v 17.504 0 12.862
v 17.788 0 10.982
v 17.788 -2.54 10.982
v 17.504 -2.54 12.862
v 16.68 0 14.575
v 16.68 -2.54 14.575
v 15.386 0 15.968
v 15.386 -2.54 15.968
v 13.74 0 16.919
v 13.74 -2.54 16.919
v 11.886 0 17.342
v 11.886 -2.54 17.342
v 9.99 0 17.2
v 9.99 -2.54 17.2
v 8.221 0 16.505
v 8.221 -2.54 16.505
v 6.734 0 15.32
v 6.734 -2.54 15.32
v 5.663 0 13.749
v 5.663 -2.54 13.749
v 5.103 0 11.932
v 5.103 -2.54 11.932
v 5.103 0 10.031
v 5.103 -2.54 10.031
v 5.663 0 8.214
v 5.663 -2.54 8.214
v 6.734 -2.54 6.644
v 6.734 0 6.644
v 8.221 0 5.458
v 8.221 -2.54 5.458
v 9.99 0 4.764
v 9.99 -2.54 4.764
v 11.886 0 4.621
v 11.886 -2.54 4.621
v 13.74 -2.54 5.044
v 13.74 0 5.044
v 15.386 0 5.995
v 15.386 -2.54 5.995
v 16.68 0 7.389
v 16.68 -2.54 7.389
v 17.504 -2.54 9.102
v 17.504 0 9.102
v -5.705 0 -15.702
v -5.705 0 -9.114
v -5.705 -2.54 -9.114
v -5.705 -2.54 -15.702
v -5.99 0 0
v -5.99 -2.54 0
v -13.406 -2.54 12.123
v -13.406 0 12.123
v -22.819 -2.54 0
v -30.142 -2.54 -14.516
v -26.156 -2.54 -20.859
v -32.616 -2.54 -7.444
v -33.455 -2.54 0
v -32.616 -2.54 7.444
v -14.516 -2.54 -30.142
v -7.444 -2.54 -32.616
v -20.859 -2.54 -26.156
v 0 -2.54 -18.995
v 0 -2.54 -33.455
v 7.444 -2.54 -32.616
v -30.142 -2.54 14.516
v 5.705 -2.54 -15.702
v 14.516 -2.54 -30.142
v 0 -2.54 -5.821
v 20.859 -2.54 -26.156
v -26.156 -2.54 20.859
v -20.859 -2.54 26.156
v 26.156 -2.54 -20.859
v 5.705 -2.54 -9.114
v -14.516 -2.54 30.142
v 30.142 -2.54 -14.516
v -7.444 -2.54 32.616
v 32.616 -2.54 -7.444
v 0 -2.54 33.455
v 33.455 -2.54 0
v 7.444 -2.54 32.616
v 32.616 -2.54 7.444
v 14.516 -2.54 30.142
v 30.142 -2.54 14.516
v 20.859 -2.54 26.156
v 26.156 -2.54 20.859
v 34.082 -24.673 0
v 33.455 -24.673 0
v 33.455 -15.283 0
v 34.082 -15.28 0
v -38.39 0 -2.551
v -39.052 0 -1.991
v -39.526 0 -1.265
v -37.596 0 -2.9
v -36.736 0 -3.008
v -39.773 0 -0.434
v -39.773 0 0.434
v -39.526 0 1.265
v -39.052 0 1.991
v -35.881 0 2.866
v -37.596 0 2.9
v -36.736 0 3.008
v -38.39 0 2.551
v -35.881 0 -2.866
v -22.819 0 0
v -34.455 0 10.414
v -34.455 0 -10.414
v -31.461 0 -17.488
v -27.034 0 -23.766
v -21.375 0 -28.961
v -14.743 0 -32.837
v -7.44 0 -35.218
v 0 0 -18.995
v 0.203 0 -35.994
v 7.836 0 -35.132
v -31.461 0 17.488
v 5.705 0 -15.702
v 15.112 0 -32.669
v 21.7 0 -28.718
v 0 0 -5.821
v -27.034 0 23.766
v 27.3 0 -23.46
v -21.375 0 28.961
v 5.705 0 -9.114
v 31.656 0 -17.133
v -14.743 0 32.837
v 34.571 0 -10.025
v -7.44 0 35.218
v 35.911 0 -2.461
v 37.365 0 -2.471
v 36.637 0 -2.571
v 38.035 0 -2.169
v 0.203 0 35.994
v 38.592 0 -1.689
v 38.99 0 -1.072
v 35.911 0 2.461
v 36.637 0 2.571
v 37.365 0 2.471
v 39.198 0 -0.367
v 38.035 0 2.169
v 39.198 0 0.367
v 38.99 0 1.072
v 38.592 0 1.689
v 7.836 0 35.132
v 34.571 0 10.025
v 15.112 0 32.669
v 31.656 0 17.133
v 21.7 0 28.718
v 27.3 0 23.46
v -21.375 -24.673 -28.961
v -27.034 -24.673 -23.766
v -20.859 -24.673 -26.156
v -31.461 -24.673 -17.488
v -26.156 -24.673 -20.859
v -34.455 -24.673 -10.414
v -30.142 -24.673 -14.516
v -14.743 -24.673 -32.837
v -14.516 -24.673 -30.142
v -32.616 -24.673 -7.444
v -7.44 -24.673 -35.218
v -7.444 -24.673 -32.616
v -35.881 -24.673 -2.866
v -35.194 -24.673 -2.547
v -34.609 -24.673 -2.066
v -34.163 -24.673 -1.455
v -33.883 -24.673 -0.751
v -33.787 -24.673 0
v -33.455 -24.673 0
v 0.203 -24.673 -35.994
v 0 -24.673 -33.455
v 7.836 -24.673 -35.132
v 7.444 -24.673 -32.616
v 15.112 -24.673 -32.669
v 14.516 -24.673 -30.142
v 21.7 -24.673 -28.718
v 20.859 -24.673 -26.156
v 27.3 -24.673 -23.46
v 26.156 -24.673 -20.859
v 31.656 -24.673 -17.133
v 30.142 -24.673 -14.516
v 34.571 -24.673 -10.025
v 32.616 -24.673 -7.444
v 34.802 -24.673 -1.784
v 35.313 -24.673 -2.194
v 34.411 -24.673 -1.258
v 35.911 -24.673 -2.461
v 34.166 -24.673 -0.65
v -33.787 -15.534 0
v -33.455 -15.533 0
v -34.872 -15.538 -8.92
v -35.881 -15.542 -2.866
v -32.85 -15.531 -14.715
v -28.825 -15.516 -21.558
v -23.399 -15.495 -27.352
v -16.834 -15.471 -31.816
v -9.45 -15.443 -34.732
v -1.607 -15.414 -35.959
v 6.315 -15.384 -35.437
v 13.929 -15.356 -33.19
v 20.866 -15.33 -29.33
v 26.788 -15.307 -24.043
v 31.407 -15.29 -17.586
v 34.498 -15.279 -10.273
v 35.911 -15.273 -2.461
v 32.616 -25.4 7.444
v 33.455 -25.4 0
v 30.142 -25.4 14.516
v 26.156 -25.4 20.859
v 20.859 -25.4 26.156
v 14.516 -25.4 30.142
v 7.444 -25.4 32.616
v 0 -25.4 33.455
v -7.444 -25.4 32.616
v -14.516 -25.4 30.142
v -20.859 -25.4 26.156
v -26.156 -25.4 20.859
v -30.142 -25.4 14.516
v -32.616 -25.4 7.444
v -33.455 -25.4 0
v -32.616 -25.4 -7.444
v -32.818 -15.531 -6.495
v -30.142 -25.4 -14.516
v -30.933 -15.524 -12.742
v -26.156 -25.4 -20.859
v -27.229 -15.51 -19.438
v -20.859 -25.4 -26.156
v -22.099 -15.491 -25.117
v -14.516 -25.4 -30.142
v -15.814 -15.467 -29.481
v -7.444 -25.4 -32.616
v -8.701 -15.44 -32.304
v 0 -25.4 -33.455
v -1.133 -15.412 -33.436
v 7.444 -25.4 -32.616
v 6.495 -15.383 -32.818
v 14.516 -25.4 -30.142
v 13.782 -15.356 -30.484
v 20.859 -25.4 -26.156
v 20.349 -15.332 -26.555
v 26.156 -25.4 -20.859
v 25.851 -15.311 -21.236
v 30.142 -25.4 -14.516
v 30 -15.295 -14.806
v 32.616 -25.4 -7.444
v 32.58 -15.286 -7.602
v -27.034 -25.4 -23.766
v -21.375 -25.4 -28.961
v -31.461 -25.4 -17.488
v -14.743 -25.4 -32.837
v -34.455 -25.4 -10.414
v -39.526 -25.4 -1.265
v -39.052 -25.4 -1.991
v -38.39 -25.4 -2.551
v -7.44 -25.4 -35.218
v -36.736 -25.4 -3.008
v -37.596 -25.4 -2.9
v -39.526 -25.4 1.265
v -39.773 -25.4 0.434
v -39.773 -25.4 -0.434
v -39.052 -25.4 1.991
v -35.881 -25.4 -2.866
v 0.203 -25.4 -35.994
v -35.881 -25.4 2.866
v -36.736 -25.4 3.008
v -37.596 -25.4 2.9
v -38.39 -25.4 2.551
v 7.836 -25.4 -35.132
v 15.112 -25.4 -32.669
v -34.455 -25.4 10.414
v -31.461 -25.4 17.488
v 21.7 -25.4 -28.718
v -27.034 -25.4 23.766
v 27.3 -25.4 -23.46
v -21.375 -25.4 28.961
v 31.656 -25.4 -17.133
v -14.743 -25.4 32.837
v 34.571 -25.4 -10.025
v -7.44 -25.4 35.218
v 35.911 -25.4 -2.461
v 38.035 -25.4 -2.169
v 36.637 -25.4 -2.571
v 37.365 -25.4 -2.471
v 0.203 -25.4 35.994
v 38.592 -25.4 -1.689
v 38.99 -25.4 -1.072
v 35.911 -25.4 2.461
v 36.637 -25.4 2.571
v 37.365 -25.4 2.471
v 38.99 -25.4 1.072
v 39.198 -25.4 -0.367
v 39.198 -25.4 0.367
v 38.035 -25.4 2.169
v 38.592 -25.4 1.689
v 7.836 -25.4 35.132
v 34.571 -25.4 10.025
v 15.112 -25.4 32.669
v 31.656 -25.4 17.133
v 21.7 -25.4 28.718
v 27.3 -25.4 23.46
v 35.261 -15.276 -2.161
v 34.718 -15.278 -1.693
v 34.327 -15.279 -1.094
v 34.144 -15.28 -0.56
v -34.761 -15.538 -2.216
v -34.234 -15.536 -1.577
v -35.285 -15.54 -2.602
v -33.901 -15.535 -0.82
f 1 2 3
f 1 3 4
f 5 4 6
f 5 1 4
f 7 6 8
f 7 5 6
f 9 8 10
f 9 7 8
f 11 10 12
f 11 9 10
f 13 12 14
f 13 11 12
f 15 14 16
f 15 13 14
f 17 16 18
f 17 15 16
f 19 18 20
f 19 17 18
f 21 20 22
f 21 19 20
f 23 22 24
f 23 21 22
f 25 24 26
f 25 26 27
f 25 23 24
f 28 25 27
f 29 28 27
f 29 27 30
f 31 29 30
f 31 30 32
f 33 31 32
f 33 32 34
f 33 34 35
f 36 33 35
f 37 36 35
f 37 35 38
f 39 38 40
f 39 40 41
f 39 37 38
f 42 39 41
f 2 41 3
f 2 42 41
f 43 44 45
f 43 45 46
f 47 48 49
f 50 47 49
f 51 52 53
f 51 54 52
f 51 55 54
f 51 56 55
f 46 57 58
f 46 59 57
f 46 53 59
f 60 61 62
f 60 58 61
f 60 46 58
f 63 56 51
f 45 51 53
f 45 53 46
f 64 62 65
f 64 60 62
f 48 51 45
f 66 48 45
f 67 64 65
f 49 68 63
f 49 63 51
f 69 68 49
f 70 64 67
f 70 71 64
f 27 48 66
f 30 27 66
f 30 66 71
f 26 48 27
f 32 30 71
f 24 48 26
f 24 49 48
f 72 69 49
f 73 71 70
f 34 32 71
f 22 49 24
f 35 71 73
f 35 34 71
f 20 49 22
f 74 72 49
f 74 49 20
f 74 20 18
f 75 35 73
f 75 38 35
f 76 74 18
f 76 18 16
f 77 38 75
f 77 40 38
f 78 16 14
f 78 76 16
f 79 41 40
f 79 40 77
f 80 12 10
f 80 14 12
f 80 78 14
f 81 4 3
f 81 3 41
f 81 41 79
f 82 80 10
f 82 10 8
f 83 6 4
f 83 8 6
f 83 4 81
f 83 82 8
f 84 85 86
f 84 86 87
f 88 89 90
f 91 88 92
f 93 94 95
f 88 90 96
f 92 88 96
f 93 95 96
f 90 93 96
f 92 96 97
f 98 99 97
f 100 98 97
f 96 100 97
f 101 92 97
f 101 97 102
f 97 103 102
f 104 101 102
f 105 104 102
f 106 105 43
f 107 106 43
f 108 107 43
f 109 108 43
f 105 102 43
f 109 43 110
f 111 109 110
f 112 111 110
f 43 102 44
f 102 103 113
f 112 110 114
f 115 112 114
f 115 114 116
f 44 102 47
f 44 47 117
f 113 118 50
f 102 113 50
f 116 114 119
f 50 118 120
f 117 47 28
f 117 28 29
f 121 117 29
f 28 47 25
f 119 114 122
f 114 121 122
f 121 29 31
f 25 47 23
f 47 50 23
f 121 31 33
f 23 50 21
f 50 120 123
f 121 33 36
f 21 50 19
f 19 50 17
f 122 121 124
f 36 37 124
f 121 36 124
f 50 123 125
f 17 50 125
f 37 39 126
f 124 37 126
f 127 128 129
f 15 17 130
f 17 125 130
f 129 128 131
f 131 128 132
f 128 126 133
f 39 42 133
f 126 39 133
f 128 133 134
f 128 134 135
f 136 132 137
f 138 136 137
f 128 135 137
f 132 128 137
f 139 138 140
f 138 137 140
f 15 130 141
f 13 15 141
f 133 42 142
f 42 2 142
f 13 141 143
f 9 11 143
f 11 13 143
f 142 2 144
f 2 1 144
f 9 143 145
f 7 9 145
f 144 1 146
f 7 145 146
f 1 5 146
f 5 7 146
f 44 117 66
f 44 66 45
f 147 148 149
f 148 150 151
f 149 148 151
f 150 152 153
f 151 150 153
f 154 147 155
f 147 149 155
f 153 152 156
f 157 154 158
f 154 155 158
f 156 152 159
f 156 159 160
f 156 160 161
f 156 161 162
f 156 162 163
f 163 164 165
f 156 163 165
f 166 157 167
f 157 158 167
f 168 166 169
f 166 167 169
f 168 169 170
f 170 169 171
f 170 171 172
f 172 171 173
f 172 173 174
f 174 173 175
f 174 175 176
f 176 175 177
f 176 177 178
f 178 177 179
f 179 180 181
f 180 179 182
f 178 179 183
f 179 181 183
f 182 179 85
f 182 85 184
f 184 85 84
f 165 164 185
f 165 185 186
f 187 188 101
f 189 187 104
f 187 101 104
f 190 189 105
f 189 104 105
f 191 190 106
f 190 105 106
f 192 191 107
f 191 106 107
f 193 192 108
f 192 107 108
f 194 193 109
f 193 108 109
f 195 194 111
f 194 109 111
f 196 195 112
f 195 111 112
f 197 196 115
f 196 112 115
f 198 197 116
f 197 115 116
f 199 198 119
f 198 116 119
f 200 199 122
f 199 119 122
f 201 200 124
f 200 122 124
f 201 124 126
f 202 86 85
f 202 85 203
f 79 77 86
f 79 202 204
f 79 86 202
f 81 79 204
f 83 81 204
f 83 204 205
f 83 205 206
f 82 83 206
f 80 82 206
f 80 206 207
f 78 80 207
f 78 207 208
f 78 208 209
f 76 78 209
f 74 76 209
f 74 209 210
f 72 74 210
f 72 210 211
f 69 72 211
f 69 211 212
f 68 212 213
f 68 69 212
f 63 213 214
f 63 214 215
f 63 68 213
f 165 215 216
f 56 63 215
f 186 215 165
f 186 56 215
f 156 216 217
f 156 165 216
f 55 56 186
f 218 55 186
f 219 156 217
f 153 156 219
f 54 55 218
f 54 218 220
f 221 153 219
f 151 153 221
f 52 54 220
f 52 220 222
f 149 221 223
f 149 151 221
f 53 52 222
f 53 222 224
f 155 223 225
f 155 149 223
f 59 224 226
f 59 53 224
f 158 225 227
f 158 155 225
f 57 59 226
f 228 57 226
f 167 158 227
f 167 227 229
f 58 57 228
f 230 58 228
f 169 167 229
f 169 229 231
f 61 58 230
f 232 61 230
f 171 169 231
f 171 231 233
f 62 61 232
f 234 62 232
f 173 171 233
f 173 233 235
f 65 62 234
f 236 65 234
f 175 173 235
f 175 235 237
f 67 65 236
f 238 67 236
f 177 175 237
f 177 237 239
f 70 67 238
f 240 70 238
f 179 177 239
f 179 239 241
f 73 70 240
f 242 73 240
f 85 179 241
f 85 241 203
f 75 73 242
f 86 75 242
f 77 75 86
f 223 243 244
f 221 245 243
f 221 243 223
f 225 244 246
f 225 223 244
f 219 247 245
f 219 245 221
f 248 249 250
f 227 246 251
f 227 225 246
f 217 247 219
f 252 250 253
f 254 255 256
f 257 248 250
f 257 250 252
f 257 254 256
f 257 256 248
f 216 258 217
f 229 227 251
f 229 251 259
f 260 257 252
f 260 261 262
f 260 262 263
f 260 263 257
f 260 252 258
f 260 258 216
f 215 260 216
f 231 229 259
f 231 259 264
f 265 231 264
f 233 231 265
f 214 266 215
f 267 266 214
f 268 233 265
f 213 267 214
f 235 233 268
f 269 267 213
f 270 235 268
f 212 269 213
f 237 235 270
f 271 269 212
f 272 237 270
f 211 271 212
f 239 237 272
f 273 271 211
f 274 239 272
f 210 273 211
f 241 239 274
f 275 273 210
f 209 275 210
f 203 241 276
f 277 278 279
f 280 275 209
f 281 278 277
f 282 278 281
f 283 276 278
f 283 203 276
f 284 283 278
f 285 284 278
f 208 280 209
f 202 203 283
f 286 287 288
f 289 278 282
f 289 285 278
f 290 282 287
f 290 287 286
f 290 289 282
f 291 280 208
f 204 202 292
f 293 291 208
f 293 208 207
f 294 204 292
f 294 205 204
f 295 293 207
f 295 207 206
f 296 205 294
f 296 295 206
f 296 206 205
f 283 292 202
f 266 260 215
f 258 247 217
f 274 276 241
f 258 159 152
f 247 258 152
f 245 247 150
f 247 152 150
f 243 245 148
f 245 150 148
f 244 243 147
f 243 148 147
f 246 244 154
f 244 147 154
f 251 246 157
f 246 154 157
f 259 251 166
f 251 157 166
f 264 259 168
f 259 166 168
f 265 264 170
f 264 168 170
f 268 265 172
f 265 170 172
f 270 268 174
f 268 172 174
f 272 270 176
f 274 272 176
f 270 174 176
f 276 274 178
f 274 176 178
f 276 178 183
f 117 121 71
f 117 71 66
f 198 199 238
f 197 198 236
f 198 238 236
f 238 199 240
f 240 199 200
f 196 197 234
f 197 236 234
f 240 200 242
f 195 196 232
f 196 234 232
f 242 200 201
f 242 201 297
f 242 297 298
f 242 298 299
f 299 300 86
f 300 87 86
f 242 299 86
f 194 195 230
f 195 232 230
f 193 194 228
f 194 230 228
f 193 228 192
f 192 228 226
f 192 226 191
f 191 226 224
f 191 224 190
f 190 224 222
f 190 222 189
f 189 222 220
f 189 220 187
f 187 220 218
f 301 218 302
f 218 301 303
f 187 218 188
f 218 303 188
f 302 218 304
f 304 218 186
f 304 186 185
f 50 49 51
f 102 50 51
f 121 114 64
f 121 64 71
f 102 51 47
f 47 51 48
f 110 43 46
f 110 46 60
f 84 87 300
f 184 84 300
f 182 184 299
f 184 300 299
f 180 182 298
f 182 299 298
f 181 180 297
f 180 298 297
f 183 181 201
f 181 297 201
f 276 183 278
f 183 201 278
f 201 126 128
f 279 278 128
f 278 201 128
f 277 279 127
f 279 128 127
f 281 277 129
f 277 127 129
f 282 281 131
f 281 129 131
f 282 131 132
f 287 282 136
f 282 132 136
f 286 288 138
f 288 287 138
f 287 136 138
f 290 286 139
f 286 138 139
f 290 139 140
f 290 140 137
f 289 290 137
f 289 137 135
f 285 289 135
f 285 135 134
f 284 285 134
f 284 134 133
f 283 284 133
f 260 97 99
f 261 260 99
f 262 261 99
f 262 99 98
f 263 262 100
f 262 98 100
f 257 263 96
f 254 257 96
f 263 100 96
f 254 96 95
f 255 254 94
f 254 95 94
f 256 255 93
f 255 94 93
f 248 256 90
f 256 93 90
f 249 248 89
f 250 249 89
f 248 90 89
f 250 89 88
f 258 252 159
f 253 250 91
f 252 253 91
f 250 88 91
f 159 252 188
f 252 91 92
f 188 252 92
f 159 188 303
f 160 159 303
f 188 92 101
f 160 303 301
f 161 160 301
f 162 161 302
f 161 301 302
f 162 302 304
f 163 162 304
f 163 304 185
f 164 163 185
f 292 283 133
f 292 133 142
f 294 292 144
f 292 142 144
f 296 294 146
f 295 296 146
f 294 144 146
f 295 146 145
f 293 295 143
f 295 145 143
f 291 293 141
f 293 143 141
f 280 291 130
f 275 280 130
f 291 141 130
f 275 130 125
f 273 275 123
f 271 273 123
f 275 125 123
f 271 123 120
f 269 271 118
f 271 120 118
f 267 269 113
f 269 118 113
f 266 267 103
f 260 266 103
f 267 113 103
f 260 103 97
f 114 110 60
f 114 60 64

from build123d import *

# Parameters (mm, degrees)
F0_R      = 35.9948936704
F1_DEPTH  = 25.4
F3_T      = -2.54
F5_DEPTH  = 25.401
F6_R      = 6.3781739211
F7_DEPTH  = 2.54
F9_DEPTH  = 114
F10_W     = 18.6832621694
F10_H     = 6.5605333075
F11_DEPTH = 114
F13_DEPTH = 114
F15_DEPTH = 114
F17_DEPTH = 25.401
F19_DEPTH = 35.9958936704
F20_R     = 3.0085790952
F21_DEPTH = 25.4
F22_R     = 2.5711256323
F23_DEPTH = 25.4


# Not quite as in the source:
# - an extrude ends at something that could not be found from the text; its depth is read off the source's solid


with BuildPart() as f1:
    # F0 (on Front) → F1 (new body)
    with BuildSketch(Plane.XZ):
        Circle(F0_R)
    extrude(amount=F1_DEPTH)

    # F3
    f3_openings = [f1.faces().sort_by_distance(p)[0] for p in [
        (0, -25.4, 0),
    ]]
    offset(amount=F3_T, openings=f3_openings)

    # F4 (on face) → F5 (cut, through all)
    with BuildSketch(Plane.XZ.offset(25.4)):
        Polygon((-13.4063111618, 12.1227279305), (-22.8192508221, 0), (-5.9900530614, 0), align=None)
    extrude(amount=-F5_DEPTH, mode=Mode.SUBTRACT)

    # F6 (on Front) → F7 (cut, through all)
    with BuildSketch(Plane.XZ):
        with Locations((11.409625411, 10.9817655757)):
            Circle(F6_R)
    extrude(amount=F7_DEPTH, mode=Mode.SUBTRACT)

    # F8 (on Front) → F9 (cut, through all)
    with BuildSketch(Plane.XZ):
        Polygon((7.8015748957, -15.0106055726), (4.1785330897, -8.0938870023), (-3.623041806, -7.7731739601), (-7.8015748957, -14.3691794883), (-4.1785330897, -21.2858980586), (3.623041806, -21.6066111008), align=None)
    extrude(amount=-F9_DEPTH, mode=Mode.SUBTRACT)

    # F10 (on Front) → F11 (cut, through all)
    with BuildSketch(Plane.XZ):
        with Locations((-9.3416310847, -10.1260426454)):
            Rectangle(F10_W, F10_H)
    extrude(amount=-F11_DEPTH, mode=Mode.SUBTRACT)

    # F12 (on Front) → F13 (cut, through all)
    with BuildSketch(Plane.XZ):
        Polygon((-16.4013374597, -20.2520862222), (12.4079678208, -20.2520862222), (14.9751342833, -13.9767900109), (-16.4013374597, -13.9767900109), align=None)
    extrude(amount=-F13_DEPTH, mode=Mode.SUBTRACT)

    # F14 (on Front) → F15 (cut, through all)
    with BuildSketch(Plane.XZ):
        Polygon((8.4161829098, -14.604808726), (4.1344067188, -7.3587224255), (-4.281776191, -7.4438062299), (-8.4161829098, -14.7749763349), (-4.1344067188, -22.0210626354), (4.281776191, -21.935978831), align=None)
    extrude(amount=-F15_DEPTH, mode=Mode.SUBTRACT)

    # F16 (on Front) → F17 (cut, through all)
    with BuildSketch(Plane.XZ):
        Polygon((5.7048136368, -15.7016435097), (5.7048136368, -9.1142921319), (0, -5.820616443), (-5.7048136368, -9.1142921319), (-5.7048136368, -15.7016435097), (0, -18.9953191986), align=None)
    extrude(amount=F17_DEPTH, mode=Mode.SUBTRACT)

    # F18 (on Top) → F19 (cut, through all)
    with BuildSketch(Plane.XY):
        Polygon((39.3632091582, -15.2603751048), (-36.7960445583, -15.5456149951), (-36.7960445583, -24.6733147651), (39.3632091582, -24.6733147651), align=None)
    extrude(amount=-F19_DEPTH, mode=Mode.SUBTRACT)

    # F20 (on Front) → F21 (join)
    with BuildSketch(Plane.XZ):
        with Locations((-36.7960445583, 0)):
            Circle(F20_R)
    extrude(amount=F21_DEPTH)

    # F22 (on Front) → F23 (join)
    with BuildSketch(Plane.XZ):
        with Locations((36.6534218192, 0)):
            Circle(F22_R)
    extrude(amount=F23_DEPTH)


solid = f1.part
